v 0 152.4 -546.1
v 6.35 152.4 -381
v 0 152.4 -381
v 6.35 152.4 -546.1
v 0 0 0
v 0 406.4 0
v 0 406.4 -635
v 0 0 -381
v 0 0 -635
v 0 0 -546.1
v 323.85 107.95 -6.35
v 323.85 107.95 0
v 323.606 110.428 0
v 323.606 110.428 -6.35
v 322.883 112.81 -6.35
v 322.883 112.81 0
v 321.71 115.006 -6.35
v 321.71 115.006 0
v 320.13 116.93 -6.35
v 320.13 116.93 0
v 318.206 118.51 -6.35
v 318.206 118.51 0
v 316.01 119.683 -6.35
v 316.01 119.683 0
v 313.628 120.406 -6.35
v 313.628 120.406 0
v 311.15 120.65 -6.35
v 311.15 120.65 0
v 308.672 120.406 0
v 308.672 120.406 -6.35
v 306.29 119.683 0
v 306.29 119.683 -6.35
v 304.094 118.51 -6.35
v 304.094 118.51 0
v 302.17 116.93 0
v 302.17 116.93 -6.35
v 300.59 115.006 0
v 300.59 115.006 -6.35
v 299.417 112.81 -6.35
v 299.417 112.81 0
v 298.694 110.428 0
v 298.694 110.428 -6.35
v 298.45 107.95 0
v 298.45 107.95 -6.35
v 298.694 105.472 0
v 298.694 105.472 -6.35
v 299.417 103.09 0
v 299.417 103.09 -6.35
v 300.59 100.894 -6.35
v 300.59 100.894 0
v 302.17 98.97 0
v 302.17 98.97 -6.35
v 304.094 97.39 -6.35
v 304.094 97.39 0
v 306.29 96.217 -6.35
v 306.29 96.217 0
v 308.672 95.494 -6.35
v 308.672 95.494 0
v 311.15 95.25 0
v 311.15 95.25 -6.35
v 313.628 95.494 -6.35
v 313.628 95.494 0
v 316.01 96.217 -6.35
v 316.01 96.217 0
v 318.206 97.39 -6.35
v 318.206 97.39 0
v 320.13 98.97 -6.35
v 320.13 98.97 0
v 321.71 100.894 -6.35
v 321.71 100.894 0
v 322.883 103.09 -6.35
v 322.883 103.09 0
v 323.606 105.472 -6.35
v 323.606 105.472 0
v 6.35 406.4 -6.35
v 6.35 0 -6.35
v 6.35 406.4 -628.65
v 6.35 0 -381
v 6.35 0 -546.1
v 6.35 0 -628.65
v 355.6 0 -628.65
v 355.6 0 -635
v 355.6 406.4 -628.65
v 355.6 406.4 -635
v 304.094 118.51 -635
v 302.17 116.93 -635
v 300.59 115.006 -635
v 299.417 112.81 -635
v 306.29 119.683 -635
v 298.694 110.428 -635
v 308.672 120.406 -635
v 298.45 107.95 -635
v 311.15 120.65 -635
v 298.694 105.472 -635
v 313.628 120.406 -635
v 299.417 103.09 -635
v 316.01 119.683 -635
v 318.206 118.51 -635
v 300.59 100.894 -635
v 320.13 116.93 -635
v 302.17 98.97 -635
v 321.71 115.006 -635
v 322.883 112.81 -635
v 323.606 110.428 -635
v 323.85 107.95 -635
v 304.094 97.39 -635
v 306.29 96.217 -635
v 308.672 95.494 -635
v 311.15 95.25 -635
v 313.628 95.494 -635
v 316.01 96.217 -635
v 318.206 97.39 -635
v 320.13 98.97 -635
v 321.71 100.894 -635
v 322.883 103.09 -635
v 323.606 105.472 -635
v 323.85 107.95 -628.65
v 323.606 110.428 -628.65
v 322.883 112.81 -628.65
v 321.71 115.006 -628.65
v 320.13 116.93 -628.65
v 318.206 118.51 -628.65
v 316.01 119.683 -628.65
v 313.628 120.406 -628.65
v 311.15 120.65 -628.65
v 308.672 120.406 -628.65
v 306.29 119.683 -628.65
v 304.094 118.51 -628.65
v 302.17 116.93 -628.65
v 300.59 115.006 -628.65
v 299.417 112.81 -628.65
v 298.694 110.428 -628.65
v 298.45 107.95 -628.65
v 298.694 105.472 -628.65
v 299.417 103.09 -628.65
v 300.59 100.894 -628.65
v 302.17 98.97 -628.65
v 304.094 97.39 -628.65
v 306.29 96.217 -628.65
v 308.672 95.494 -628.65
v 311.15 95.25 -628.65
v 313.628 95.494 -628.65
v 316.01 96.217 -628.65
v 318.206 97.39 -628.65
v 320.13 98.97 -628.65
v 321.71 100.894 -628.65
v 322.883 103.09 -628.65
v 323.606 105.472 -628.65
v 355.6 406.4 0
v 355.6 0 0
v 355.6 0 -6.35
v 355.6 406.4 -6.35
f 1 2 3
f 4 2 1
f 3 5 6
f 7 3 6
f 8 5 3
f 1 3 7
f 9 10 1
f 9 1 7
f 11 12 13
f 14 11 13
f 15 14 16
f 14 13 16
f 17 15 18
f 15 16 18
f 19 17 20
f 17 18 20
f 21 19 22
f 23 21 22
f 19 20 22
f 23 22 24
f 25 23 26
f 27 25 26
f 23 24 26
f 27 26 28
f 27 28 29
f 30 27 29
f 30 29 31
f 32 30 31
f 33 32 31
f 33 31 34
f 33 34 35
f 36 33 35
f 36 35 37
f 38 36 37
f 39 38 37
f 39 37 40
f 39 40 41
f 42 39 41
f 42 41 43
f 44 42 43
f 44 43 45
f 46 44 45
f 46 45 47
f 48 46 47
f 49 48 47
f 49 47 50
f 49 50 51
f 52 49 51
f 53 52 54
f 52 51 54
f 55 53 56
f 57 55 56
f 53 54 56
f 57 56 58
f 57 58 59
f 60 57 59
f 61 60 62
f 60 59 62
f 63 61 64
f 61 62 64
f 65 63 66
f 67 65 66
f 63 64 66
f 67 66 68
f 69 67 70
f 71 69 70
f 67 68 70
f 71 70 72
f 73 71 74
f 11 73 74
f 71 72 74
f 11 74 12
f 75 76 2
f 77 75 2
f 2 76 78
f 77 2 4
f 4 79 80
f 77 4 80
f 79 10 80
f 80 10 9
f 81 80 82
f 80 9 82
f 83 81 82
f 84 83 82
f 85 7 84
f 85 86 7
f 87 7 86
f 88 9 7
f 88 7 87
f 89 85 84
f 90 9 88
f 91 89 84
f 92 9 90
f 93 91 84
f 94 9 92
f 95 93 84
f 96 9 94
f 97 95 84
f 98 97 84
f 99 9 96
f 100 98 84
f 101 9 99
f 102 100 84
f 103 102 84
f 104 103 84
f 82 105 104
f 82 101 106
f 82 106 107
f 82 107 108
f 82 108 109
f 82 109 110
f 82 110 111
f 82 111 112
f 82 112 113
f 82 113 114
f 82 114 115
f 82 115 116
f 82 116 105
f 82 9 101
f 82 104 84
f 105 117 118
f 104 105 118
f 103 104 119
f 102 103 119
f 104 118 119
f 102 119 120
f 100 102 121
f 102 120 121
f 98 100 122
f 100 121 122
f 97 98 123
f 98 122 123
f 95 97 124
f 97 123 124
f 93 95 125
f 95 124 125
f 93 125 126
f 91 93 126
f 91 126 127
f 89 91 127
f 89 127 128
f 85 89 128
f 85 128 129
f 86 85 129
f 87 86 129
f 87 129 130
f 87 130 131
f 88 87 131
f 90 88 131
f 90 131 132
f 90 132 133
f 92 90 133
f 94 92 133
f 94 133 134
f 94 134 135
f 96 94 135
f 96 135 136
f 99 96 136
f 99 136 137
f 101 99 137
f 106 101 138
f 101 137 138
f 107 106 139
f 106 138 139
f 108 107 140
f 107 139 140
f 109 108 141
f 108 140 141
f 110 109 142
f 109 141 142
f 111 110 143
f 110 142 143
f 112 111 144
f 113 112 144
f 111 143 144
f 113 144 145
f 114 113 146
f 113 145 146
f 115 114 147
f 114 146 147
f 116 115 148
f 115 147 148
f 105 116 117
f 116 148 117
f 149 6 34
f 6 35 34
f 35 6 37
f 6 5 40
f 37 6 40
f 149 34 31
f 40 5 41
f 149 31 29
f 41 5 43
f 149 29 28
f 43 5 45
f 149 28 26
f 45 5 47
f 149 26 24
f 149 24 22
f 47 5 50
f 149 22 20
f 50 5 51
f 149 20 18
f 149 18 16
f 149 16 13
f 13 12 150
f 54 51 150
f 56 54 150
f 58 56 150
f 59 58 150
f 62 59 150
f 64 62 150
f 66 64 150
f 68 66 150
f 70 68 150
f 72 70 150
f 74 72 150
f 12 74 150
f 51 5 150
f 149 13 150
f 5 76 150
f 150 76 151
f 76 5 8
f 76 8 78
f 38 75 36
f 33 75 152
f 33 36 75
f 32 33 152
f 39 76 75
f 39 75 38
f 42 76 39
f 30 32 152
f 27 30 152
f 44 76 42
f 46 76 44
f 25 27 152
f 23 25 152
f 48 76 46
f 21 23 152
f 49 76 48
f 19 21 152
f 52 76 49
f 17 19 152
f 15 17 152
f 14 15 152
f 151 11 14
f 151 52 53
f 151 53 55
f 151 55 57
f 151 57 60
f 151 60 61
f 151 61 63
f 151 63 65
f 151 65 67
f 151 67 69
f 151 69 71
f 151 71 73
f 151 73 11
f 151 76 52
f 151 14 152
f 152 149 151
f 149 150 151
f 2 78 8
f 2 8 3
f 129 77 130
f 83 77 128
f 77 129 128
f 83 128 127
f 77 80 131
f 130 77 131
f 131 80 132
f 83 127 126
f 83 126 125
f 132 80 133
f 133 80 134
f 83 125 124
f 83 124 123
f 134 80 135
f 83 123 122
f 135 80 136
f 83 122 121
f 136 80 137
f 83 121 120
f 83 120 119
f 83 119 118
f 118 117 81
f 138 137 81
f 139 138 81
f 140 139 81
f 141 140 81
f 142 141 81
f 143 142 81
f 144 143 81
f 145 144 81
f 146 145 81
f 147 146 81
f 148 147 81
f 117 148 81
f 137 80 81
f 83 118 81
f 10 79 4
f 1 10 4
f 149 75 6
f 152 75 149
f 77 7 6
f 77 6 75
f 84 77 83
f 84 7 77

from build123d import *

# Parameters (mm, degrees)
SKETCH1_W           = 355.6
SKETCH1_H           = 635
BOSS_EXTRUDE1_DEPTH = 406.4
SHELL1_T            = -6.35
SKETCH2_W           = 165.1
SKETCH2_H           = 152.4
CUT_EXTRUDE1_DEPTH  = 7.35
SKETCH3_R           = 12.7
CUT_EXTRUDE2_DEPTH  = 636


with BuildPart() as part:
    # Sketch1 → Boss-Extrude1 (new body)
    with BuildSketch(Plane(origin=(0, 0, 0), x_dir=(1, 0, 0), z_dir=(0, 1, 0))):
        with Locations((177.8, 317.5)):
            Rectangle(SKETCH1_W, SKETCH1_H)
    extrude(amount=BOSS_EXTRUDE1_DEPTH)

    # Shell1
    shell1_openings = [part.faces().sort_by_distance(p)[0] for p in [
        (177.8, 406.4, -317.5),
        (177.8, 0, -317.5),
        (355.6, 203.2, -317.5),
    ]]
    offset(amount=SHELL1_T, openings=shell1_openings, kind=Kind.INTERSECTION)

    # Sketch2 → Cut-Extrude1 (cut, through all)
    with BuildSketch(Plane(origin=(6.35, 0, 0), x_dir=(0, 0, -1), z_dir=(1, 0, 0))):
        with Locations((463.55, 76.2)):
            Rectangle(SKETCH2_W, SKETCH2_H)
    extrude(amount=-CUT_EXTRUDE1_DEPTH, mode=Mode.SUBTRACT)

    # Sketch3 → Cut-Extrude2 (cut, through all)
    with BuildSketch(Plane.XY):
        with Locations((311.15, 107.95)):
            Circle(SKETCH3_R)
    extrude(amount=-CUT_EXTRUDE2_DEPTH, mode=Mode.SUBTRACT)


solid = part.part
